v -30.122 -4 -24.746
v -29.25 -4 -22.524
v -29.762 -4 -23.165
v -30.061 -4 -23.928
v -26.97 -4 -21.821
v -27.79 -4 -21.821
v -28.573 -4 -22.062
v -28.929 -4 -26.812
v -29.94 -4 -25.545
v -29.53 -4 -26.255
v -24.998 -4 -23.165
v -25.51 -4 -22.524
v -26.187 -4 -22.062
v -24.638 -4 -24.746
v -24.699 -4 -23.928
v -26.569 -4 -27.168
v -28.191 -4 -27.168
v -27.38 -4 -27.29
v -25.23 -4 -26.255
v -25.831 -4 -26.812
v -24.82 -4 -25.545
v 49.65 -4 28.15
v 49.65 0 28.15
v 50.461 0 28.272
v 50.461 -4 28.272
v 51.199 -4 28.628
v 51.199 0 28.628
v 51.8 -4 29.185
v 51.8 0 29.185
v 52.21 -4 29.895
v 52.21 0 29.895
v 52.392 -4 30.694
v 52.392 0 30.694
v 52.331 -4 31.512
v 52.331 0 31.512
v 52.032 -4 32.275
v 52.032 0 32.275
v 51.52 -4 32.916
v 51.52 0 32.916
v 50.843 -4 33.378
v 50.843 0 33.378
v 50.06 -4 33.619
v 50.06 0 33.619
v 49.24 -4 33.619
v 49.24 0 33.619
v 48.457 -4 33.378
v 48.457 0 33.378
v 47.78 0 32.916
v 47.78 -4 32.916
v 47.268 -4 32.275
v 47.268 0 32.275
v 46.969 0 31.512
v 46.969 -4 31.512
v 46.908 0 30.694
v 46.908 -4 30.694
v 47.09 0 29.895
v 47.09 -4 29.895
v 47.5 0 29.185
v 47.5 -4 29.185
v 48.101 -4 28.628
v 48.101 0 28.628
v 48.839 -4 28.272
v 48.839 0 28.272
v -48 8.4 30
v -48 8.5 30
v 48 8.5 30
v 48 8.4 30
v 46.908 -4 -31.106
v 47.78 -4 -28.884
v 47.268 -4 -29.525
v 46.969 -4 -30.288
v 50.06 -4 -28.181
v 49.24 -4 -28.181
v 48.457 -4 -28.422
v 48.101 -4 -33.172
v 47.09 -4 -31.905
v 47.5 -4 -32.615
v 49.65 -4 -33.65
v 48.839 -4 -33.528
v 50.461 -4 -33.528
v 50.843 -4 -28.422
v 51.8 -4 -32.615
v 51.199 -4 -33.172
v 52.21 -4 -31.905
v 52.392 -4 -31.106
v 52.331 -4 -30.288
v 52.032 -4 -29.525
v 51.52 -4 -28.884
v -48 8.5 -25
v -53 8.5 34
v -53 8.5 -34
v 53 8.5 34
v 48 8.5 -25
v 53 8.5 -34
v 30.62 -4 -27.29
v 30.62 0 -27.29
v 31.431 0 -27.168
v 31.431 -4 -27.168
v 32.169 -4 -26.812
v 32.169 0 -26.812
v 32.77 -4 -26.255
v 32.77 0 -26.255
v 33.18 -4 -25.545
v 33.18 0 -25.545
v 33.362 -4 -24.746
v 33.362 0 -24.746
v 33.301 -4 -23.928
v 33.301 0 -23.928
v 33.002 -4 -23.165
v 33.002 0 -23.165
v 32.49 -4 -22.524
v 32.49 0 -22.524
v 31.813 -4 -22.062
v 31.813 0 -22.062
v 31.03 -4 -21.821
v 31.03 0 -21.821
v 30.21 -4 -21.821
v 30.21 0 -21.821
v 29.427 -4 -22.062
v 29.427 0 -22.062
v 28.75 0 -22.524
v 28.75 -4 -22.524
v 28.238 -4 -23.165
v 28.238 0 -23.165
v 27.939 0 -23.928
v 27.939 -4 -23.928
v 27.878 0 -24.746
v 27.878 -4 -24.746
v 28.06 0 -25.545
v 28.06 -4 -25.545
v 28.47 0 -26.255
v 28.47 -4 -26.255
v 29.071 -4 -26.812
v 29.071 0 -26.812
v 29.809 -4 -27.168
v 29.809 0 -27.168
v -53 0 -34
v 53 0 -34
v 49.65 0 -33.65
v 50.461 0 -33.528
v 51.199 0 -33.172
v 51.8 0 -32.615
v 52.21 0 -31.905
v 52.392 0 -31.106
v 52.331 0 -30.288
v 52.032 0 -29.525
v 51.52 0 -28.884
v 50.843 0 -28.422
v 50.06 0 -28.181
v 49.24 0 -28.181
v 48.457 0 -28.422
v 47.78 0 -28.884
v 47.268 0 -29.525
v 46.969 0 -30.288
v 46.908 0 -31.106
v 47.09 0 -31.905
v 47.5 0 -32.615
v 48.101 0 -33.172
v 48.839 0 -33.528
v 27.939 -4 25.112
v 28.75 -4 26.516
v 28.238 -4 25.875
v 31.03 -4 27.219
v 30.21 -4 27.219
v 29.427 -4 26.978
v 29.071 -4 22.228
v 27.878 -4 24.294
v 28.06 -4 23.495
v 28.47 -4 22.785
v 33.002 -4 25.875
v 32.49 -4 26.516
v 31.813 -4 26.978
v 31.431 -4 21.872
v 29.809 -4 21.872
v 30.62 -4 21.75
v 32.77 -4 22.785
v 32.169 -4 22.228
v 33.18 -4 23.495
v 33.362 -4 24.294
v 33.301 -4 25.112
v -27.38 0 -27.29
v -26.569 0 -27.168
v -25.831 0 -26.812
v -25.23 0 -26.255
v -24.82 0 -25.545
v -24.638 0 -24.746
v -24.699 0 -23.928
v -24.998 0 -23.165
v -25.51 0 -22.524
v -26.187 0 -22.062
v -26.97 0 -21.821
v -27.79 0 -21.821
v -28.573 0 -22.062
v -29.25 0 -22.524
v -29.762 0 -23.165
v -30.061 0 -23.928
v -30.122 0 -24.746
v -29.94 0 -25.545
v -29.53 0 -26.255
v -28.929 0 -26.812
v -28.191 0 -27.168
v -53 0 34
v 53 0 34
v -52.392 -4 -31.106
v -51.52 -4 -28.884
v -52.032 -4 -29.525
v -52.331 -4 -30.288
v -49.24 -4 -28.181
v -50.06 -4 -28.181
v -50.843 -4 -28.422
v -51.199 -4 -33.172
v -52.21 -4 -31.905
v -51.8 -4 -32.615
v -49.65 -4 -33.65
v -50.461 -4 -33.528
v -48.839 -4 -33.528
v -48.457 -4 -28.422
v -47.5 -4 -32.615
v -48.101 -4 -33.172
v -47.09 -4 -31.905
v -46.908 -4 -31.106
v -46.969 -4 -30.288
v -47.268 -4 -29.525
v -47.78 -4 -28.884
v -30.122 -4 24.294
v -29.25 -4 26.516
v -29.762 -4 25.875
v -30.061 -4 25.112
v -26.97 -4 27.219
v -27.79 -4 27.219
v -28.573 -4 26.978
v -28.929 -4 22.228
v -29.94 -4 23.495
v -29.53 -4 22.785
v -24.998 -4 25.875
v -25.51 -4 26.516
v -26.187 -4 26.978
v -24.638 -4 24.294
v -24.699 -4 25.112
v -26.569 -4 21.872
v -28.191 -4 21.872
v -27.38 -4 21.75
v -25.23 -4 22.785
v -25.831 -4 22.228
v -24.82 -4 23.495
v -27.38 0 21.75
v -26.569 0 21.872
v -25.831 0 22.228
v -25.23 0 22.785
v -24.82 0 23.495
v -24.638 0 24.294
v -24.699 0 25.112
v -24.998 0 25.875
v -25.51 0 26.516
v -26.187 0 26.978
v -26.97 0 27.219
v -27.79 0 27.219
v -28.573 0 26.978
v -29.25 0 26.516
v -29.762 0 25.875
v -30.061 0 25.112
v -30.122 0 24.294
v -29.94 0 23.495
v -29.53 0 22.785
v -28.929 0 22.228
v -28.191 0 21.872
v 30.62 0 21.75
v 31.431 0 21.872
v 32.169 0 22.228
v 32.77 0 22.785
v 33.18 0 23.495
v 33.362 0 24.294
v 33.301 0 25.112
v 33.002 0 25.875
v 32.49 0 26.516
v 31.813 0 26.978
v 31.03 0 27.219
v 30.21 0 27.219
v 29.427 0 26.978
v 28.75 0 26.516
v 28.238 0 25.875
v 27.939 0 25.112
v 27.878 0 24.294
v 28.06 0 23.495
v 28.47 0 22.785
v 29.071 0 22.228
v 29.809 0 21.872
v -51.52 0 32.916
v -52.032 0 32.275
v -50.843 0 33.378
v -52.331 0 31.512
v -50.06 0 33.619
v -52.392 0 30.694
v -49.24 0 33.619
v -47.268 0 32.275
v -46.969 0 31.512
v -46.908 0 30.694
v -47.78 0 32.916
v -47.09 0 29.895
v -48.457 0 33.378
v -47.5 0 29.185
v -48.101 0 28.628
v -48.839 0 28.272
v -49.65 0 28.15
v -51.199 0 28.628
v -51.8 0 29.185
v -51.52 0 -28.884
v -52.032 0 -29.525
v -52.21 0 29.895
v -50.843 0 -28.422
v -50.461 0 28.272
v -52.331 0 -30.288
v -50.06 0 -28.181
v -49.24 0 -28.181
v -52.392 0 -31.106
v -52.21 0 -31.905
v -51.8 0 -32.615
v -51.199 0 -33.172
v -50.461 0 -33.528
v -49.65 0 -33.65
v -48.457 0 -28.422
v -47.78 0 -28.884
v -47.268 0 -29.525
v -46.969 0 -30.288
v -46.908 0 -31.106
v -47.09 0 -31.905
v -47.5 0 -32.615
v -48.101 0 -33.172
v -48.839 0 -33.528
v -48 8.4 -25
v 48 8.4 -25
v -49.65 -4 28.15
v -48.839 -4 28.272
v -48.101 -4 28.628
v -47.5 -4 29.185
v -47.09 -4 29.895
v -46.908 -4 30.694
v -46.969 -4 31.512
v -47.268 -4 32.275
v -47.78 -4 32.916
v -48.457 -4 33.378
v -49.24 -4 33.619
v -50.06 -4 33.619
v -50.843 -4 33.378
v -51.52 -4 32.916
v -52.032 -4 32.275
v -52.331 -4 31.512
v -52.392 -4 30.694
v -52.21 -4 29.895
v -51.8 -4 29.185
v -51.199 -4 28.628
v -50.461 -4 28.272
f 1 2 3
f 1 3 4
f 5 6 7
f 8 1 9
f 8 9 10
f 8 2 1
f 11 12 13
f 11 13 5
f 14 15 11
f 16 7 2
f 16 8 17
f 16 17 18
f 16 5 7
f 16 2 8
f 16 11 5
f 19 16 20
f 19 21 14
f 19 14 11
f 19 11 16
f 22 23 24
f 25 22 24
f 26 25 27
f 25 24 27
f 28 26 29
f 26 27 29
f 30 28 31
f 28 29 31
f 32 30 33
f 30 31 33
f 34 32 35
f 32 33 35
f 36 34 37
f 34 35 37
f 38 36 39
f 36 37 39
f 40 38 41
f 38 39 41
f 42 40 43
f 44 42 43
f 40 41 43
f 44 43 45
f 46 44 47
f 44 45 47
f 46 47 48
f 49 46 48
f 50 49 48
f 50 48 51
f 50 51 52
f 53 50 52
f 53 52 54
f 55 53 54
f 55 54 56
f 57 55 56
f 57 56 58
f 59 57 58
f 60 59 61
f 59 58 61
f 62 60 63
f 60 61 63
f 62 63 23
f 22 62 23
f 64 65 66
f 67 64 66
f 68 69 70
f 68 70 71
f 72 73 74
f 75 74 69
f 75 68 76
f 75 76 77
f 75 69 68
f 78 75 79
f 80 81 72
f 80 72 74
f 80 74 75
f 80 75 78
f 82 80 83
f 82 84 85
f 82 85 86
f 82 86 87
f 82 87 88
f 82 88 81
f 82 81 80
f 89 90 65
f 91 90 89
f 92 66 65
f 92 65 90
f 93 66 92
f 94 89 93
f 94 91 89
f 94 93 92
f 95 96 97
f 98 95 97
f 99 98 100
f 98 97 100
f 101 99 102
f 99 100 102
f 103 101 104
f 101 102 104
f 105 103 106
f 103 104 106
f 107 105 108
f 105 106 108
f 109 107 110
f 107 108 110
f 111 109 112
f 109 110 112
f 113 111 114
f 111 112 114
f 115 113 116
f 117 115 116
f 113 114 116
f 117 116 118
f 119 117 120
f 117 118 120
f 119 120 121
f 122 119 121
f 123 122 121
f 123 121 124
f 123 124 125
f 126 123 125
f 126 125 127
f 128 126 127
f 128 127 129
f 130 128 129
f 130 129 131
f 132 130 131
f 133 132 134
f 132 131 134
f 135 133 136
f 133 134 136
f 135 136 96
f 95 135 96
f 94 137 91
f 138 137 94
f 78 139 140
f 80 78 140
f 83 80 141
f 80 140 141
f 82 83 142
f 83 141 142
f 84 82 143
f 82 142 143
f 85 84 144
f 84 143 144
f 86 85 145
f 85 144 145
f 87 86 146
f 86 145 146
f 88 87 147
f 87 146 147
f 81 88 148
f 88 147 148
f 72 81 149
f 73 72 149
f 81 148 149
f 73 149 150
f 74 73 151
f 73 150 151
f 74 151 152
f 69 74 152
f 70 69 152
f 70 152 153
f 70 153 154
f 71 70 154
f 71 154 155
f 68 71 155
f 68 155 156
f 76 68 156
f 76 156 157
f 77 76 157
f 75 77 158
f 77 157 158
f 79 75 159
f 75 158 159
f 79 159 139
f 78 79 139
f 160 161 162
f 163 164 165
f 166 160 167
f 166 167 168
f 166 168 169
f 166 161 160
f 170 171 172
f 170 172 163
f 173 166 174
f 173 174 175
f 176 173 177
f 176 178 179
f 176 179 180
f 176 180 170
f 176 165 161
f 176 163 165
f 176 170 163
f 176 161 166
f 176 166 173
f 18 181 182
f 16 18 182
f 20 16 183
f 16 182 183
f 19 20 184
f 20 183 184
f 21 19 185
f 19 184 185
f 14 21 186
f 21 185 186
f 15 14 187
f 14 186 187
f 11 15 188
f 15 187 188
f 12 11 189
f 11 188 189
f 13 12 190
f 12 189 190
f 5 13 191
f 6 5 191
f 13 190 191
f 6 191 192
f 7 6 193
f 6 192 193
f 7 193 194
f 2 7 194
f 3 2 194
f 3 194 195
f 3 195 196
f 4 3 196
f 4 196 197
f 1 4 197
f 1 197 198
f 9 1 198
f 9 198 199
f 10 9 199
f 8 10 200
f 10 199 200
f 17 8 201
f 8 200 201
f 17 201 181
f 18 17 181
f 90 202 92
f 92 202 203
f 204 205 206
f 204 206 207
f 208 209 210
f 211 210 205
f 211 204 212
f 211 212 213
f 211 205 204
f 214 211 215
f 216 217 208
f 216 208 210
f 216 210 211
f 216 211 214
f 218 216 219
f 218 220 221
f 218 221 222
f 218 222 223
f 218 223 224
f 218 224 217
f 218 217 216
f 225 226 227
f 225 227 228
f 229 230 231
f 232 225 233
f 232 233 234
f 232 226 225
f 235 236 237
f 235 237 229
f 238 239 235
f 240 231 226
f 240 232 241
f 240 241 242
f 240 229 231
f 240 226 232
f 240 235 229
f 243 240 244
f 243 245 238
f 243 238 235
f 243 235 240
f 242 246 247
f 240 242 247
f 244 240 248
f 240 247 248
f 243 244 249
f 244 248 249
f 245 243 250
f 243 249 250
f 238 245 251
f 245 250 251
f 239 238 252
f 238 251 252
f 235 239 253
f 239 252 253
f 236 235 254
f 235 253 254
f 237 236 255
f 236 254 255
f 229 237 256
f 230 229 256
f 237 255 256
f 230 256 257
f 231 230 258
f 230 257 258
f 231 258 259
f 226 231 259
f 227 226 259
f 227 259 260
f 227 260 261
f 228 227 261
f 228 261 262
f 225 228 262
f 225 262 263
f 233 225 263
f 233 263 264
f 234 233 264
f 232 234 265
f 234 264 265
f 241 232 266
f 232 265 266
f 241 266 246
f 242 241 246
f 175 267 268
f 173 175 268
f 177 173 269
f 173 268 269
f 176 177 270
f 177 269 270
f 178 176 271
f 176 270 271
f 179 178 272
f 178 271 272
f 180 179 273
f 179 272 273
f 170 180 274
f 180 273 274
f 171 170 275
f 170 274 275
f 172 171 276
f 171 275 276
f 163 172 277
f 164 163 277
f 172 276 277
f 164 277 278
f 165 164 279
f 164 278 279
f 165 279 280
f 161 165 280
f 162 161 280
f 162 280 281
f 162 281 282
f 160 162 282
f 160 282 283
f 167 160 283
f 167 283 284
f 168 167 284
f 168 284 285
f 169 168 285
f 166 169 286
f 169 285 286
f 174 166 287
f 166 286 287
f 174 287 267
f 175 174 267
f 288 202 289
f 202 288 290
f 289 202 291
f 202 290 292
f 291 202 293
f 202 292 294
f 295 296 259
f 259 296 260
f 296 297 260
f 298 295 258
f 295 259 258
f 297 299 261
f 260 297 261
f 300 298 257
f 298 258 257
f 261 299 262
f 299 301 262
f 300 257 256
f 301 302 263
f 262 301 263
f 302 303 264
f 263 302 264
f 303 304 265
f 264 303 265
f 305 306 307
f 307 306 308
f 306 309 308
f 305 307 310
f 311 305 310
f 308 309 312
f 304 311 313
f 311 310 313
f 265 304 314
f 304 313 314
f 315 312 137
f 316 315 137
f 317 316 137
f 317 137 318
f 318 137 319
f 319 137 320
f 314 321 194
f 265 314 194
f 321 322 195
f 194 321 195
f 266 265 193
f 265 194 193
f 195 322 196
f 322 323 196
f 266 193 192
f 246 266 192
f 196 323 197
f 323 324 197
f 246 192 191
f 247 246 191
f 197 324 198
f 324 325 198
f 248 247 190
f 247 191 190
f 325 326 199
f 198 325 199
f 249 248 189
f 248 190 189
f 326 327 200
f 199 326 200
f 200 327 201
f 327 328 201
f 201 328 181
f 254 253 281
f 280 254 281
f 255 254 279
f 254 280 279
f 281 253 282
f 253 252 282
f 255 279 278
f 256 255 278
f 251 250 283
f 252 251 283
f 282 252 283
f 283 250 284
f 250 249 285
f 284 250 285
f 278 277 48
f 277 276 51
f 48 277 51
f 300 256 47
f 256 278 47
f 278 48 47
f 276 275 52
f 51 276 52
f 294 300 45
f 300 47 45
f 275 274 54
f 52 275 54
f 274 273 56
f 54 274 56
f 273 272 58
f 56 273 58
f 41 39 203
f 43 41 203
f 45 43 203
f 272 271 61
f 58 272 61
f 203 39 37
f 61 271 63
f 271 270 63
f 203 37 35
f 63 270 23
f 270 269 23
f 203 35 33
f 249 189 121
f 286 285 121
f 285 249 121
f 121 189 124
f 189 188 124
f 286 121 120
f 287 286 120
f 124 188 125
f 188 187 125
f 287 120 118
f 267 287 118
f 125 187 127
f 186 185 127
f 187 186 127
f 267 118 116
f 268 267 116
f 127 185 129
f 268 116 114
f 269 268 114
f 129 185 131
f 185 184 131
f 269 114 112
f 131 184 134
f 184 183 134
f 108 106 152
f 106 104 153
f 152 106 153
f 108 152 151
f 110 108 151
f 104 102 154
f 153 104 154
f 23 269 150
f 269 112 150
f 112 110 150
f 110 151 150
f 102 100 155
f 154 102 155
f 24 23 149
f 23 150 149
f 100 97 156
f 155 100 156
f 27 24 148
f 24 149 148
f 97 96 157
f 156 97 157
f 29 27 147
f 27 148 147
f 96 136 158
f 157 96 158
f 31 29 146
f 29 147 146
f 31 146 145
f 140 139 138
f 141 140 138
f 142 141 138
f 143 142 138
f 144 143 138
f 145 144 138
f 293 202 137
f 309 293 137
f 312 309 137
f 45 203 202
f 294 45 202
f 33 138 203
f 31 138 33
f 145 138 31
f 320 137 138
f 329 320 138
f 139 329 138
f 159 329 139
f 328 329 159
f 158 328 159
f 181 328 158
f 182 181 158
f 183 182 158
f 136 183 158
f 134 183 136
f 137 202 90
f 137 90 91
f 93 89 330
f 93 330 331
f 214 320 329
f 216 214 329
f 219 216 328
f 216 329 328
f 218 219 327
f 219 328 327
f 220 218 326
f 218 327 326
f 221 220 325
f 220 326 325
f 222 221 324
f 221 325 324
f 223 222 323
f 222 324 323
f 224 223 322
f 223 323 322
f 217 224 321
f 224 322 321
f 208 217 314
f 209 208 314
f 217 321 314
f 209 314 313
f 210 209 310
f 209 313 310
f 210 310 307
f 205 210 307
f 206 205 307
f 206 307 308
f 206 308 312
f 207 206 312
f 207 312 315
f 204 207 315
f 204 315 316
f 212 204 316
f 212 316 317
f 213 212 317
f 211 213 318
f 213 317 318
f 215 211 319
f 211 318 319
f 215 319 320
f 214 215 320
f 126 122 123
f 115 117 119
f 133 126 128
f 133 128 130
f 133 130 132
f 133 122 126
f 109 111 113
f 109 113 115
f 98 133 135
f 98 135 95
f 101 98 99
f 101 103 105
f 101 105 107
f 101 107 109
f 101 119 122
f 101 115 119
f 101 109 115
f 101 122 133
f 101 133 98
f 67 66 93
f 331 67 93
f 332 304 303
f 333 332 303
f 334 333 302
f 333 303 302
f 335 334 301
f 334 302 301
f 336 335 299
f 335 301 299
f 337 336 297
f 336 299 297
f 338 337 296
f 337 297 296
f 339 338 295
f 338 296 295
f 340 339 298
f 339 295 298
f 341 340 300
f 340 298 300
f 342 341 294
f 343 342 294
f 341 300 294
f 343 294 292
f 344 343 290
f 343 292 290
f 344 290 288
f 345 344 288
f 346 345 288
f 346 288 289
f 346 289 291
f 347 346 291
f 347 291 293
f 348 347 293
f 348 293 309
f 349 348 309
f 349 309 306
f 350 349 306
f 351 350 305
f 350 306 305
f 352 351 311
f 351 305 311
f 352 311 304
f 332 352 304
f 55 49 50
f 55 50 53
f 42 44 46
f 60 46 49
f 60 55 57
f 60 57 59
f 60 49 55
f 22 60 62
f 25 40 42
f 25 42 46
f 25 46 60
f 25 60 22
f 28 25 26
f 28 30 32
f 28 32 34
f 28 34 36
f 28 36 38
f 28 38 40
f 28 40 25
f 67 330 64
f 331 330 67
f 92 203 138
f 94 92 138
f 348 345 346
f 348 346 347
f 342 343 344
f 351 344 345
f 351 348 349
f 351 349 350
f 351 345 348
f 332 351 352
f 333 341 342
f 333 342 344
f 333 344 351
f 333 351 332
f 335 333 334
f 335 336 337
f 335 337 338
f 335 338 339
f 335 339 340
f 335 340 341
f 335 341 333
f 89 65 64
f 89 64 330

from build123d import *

# Parameters (mm, degrees)
SKETCH1_W           = 106
SKETCH1_H           = 68
BOSS_EXTRUDE1_DEPTH = 8.5
SKETCH2_R           = 2.75
BOSS_EXTRUDE2_DEPTH = 4
SKETCH4_W           = 96
SKETCH4_H           = 55
CUT_EXTRUDE1_DEPTH  = 0.1


with BuildPart() as part:
    # Sketch1 → Boss-Extrude1 (new body)
    with BuildSketch(Plane(origin=(0, 0, 0), x_dir=(1, 0, 0), z_dir=(0, 1, 0))):
        Rectangle(SKETCH1_W, SKETCH1_H)
    extrude(amount=BOSS_EXTRUDE1_DEPTH)

    # Sketch2 → Boss-Extrude2 (add)
    with BuildSketch(Plane(origin=(0, 0, 0), x_dir=(-1, 0, 0), z_dir=(0, -1, 0))):
        with Locations(Location((49.65, -30.9, 0), (0, 0, 90))):
            Circle(SKETCH2_R)
        with Locations(Location((-49.65, -30.9, 0), (0, 0, 90))):
            Circle(SKETCH2_R)
        with Locations(Location((49.65, 30.9, 0), (0, 0, 90))):
            Circle(SKETCH2_R)
        with Locations(Location((-49.65, 30.9, 0), (0, 0, 90))):
            Circle(SKETCH2_R)
        with Locations(Location((27.38, -24.5, 0), (0, 0, 90))):
            Circle(SKETCH2_R)
        with Locations(Location((-30.62, -24.5, 0), (0, 0, 90))):
            Circle(SKETCH2_R)
        with Locations(Location((27.38, 24.54, 0), (0, 0, 90))):
            Circle(SKETCH2_R)
        with Locations(Location((-30.62, 24.54, 0), (0, 0, 90))):
            Circle(SKETCH2_R)
    extrude(amount=BOSS_EXTRUDE2_DEPTH)

    # Sketch4 → Cut-Extrude1 (cut)
    with BuildSketch(Plane(origin=(0, 8.5, 0), x_dir=(1, 0, 0), z_dir=(0, 1, 0))):
        with Locations((0, -2.5)):
            Rectangle(SKETCH4_W, SKETCH4_H)
    extrude(amount=-CUT_EXTRUDE1_DEPTH, mode=Mode.SUBTRACT)


solid = part.part
